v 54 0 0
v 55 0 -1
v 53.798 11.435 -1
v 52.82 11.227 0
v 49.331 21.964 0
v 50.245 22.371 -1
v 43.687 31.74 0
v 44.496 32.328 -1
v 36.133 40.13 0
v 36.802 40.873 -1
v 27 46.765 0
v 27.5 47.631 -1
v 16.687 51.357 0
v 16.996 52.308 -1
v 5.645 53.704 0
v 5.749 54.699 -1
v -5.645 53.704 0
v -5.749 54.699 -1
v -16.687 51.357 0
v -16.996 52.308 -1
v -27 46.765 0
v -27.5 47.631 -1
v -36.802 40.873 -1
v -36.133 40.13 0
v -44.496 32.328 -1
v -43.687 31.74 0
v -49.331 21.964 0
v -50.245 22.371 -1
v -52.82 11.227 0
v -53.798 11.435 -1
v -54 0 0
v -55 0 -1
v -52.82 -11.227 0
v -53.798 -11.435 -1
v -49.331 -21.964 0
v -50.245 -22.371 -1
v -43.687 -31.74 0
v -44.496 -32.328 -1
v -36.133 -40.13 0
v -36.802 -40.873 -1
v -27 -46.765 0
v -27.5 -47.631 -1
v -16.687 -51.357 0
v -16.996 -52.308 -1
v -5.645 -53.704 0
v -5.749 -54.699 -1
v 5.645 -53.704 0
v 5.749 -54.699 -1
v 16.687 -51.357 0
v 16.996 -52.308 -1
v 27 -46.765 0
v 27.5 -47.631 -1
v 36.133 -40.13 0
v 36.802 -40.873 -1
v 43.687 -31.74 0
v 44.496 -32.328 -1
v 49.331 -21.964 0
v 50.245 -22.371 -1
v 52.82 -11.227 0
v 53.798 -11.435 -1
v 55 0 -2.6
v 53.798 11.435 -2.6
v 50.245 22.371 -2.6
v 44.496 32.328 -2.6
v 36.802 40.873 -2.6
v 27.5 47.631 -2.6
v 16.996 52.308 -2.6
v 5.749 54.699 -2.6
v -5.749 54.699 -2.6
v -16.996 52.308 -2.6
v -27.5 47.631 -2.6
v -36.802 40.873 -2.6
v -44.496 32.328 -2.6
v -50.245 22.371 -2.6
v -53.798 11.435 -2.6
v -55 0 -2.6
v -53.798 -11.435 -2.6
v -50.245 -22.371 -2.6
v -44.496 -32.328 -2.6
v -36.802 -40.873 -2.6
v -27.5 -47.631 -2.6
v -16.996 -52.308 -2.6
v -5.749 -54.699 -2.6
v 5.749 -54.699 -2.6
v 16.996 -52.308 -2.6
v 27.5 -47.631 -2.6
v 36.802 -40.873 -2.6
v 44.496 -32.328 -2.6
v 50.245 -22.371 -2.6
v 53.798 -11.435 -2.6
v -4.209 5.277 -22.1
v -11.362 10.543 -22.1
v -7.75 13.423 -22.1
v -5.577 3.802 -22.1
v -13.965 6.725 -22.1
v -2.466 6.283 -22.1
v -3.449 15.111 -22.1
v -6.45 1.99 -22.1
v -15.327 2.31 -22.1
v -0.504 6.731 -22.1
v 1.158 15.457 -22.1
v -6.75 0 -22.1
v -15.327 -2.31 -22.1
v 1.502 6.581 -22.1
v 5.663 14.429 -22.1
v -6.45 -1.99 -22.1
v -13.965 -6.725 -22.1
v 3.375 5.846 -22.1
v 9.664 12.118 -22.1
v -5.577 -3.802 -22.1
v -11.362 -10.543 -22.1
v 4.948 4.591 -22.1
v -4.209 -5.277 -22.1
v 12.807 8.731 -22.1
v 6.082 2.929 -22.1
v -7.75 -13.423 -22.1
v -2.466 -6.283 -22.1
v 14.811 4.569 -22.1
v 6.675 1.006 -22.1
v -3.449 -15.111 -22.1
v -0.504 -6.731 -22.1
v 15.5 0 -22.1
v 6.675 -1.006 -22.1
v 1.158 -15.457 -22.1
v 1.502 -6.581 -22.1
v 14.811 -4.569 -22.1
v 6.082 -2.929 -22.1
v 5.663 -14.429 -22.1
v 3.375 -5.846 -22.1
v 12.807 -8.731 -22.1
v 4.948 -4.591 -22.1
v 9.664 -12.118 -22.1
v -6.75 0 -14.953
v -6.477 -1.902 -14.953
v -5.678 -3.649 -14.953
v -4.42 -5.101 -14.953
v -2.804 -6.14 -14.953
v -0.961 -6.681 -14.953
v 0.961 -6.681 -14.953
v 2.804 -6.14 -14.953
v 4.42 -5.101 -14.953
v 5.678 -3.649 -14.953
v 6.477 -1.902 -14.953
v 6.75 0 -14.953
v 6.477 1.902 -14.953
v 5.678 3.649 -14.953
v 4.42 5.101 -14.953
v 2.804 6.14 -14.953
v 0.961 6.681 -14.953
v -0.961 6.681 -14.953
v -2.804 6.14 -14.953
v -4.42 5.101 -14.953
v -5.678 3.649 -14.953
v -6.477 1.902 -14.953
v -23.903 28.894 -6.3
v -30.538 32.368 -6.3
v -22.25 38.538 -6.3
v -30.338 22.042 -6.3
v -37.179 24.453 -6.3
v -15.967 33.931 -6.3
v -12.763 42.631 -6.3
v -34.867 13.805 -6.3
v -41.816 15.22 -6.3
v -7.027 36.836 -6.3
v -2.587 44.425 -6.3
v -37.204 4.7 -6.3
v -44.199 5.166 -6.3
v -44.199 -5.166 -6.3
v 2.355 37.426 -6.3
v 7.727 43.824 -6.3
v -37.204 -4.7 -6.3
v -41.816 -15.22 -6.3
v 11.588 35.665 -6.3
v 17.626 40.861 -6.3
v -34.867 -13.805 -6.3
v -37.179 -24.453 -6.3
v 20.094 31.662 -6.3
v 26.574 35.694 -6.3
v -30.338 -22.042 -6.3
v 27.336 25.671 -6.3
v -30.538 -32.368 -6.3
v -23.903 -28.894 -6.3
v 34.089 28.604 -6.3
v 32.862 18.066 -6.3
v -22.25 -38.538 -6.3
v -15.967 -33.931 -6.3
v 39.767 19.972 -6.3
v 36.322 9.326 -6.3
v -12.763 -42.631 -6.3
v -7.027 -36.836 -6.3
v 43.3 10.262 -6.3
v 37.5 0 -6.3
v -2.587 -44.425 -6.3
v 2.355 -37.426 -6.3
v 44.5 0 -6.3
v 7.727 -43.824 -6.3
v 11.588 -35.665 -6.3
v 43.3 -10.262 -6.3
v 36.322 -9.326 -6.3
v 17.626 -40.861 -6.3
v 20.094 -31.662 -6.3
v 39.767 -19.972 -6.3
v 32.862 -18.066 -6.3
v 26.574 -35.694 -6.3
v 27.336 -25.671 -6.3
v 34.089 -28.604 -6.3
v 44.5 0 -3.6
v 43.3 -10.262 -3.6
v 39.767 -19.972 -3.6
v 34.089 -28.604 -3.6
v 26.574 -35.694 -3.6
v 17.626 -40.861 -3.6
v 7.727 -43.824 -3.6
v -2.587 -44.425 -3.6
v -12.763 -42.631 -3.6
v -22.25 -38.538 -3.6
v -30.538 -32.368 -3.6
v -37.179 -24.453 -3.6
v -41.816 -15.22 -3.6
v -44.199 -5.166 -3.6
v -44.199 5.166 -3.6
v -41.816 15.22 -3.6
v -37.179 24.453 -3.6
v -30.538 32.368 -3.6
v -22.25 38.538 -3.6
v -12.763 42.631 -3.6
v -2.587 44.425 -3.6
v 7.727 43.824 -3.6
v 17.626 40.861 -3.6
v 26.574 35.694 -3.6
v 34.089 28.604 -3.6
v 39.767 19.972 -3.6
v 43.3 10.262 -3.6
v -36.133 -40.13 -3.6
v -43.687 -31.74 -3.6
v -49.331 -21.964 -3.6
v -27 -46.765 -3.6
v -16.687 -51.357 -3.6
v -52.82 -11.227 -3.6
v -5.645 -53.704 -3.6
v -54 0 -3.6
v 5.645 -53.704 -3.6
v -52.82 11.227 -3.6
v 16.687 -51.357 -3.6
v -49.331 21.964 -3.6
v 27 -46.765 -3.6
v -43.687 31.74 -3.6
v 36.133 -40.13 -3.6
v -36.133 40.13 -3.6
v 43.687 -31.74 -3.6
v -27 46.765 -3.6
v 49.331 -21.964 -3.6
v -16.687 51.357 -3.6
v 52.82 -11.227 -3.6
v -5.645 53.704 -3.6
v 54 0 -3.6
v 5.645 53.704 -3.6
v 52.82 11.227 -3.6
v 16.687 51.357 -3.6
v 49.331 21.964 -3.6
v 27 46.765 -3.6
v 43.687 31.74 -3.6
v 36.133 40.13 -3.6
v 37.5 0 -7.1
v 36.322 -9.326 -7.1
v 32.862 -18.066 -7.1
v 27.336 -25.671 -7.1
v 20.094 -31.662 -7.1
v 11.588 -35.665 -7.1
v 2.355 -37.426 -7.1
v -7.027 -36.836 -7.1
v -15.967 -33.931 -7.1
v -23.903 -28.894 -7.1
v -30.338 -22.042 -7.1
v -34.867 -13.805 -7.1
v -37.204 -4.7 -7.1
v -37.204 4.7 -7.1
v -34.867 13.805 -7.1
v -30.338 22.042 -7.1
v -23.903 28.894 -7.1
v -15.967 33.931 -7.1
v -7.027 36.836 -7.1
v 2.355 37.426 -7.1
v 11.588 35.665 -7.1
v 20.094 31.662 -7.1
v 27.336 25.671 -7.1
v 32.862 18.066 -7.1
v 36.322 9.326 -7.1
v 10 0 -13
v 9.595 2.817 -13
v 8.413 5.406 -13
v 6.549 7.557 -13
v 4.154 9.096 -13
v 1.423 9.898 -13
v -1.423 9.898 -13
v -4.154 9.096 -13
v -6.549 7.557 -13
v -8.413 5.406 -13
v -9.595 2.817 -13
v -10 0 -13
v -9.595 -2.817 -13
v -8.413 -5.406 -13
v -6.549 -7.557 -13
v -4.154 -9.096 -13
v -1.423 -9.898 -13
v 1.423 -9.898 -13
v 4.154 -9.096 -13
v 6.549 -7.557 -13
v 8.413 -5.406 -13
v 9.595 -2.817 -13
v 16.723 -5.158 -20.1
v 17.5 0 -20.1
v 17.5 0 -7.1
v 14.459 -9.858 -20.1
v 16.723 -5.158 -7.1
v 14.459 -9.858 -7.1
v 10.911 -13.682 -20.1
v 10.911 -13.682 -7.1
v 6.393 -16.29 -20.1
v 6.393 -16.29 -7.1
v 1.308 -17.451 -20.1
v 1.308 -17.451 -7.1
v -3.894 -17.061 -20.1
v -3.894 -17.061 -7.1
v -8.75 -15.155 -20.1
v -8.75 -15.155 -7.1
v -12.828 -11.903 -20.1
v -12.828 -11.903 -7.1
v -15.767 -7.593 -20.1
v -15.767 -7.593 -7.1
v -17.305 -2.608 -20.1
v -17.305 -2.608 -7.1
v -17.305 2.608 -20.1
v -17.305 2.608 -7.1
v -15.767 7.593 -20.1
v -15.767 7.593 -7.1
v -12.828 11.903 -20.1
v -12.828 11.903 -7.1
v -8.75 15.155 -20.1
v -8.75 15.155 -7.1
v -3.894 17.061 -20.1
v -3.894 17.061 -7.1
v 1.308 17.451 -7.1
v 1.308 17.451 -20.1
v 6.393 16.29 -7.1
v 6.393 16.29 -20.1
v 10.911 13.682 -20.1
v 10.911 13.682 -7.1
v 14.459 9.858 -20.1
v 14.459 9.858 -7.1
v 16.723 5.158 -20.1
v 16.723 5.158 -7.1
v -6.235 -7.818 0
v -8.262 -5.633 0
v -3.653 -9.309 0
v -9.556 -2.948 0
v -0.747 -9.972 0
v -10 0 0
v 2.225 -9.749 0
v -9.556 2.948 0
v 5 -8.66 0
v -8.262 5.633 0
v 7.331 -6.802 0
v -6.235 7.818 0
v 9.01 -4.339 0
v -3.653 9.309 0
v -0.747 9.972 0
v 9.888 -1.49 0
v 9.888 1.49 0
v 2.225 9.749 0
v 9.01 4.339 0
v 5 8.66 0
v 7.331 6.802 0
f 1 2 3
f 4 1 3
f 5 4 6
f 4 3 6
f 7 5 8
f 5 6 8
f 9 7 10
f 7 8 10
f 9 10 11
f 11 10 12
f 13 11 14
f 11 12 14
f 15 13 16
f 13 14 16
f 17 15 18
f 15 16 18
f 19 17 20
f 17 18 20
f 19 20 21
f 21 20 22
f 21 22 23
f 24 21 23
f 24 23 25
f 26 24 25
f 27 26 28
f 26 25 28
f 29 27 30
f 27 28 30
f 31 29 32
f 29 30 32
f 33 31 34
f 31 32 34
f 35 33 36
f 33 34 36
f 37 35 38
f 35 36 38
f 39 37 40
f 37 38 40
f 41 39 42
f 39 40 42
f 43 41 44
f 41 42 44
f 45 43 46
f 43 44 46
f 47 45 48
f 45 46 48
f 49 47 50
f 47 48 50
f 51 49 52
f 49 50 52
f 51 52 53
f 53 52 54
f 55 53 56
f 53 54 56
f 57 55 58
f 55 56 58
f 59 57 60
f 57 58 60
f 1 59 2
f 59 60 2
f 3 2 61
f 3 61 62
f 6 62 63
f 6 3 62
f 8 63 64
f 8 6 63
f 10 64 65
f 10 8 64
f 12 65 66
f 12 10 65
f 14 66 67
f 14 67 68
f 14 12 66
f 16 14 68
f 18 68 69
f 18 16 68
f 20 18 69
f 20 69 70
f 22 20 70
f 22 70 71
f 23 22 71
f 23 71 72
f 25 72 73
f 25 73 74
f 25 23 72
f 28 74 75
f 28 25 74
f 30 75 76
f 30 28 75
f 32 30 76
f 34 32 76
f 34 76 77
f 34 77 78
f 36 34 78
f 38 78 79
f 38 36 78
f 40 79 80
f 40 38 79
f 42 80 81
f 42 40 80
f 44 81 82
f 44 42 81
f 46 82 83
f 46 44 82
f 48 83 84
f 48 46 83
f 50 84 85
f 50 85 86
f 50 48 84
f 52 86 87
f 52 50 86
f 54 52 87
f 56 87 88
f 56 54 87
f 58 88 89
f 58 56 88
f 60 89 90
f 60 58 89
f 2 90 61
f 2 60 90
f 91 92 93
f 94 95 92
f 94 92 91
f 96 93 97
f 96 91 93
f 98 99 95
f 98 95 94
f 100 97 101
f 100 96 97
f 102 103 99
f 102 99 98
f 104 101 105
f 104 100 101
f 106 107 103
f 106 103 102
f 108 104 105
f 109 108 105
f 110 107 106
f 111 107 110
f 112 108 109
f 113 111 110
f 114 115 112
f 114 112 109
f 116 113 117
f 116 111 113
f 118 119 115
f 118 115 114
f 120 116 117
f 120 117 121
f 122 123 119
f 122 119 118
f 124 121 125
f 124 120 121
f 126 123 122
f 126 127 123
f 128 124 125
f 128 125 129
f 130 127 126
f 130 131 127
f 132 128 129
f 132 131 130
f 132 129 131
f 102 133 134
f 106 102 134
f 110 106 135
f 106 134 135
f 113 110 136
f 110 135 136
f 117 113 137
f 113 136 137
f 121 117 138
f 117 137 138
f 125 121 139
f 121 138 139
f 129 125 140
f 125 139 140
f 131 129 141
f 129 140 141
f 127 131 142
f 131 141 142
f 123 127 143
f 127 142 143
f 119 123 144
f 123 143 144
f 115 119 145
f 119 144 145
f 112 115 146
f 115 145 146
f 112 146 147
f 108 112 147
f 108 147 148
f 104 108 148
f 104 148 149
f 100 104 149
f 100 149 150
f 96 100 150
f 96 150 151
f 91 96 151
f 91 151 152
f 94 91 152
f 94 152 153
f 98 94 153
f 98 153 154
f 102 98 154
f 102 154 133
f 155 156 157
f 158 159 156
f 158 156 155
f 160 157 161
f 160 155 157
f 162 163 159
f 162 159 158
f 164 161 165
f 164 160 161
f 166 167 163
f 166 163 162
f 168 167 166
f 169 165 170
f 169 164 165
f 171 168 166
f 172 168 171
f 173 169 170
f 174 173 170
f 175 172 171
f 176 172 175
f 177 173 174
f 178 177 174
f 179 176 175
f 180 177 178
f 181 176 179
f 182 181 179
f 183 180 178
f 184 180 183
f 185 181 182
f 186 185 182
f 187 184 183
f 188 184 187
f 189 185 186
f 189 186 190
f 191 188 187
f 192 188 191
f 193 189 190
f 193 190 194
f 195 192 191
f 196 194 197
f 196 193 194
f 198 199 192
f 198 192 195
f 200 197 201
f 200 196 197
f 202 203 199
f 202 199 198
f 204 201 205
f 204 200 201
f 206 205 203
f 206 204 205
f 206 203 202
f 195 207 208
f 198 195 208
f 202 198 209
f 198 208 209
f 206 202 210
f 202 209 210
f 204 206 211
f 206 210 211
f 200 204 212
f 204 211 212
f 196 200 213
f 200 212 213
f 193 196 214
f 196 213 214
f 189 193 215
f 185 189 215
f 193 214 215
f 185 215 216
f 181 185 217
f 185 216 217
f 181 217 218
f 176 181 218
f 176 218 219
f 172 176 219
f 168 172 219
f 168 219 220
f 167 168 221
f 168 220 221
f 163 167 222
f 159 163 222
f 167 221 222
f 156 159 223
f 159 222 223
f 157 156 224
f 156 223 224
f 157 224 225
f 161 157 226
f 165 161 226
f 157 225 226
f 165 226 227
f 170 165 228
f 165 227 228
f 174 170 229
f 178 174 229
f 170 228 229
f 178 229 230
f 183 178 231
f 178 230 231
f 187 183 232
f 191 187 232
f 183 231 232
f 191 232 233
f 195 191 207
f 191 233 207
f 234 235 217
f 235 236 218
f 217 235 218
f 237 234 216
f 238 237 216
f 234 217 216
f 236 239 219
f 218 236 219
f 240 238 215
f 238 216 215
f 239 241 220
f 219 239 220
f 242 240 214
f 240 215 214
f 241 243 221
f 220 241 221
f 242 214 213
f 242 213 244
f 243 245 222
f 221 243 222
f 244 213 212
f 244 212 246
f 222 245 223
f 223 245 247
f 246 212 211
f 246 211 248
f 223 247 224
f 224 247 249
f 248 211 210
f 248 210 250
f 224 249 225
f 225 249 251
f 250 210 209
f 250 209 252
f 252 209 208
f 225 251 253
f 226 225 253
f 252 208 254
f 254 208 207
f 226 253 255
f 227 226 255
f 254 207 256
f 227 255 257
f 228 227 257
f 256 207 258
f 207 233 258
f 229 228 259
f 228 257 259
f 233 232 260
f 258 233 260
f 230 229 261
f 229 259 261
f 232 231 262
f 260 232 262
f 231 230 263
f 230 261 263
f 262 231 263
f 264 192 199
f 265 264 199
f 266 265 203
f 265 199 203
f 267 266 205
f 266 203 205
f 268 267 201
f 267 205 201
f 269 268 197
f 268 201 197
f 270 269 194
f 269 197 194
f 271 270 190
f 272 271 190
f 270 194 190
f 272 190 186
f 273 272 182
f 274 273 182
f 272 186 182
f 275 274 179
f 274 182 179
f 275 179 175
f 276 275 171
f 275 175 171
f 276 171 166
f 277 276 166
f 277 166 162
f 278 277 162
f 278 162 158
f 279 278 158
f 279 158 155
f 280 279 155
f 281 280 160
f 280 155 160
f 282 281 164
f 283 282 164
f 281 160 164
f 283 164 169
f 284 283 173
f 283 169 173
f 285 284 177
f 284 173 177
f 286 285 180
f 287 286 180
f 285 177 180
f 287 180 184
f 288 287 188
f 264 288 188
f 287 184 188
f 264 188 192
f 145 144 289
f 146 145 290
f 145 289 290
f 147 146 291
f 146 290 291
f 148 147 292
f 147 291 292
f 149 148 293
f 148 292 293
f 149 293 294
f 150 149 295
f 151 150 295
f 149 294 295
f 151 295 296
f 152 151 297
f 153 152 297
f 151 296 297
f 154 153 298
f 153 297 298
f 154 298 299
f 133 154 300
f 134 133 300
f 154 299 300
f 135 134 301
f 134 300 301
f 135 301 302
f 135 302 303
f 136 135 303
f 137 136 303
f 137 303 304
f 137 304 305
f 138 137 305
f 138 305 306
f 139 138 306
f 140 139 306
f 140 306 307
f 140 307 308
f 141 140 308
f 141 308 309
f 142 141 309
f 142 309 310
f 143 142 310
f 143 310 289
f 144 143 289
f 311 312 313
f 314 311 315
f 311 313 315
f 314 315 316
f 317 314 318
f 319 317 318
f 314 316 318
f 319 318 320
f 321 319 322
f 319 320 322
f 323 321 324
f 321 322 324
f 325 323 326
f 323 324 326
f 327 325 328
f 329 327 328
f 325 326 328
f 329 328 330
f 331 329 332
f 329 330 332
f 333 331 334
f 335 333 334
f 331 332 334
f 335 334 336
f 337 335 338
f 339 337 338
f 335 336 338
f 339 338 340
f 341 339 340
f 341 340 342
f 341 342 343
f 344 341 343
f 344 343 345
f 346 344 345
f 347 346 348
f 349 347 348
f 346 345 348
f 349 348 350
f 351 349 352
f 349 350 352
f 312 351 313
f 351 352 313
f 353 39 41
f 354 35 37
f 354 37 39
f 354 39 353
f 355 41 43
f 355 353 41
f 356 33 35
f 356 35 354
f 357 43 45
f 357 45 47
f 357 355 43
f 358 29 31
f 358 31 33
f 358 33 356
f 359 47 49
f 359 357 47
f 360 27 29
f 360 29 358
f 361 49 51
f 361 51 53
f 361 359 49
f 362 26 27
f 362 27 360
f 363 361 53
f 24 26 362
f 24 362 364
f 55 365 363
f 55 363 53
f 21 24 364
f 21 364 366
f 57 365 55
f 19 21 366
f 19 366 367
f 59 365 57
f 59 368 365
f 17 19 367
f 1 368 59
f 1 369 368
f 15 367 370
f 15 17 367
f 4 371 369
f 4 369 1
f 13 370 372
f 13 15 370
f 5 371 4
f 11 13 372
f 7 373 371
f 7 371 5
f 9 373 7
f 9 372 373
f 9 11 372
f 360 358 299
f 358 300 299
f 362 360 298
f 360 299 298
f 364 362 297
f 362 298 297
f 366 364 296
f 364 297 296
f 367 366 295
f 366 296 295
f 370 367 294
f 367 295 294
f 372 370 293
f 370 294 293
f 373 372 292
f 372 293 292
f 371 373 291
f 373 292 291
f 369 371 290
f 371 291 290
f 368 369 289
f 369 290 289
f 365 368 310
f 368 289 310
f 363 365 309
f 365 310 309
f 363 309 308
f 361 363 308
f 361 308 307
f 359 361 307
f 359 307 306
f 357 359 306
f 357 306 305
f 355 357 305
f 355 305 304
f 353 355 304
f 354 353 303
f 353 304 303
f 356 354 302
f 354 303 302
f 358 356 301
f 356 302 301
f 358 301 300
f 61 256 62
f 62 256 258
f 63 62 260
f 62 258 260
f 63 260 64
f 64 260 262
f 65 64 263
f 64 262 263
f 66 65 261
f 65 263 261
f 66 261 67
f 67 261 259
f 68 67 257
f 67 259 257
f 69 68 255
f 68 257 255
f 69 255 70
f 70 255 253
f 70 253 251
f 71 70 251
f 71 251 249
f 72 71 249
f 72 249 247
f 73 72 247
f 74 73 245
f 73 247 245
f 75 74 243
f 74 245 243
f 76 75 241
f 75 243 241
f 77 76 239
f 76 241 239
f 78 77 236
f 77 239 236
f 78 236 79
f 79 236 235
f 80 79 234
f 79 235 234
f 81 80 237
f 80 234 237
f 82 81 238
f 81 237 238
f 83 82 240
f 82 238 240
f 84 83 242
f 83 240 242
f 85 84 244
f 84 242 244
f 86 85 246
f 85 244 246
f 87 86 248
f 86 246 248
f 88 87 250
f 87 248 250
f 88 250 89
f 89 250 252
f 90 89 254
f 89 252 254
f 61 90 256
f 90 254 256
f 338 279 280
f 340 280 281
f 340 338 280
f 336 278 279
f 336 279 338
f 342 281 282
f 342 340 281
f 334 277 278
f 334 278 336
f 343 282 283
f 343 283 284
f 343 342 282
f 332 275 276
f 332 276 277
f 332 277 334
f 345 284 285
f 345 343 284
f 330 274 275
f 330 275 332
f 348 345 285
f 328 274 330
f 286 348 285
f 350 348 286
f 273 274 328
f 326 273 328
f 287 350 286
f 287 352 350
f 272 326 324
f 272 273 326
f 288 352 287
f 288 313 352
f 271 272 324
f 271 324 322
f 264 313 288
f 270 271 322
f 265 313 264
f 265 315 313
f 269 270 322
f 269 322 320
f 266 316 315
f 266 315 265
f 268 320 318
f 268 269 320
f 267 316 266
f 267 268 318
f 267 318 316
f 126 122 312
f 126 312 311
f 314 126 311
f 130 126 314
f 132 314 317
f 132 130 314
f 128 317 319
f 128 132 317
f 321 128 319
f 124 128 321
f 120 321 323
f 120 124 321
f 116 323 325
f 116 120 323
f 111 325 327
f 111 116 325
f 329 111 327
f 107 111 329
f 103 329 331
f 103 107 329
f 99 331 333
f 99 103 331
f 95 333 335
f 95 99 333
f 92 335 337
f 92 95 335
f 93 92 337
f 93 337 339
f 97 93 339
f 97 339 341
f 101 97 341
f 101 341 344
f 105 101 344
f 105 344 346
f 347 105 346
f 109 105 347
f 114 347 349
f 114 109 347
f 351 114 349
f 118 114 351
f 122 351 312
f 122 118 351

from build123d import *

# Parameters (mm, degrees)
F0_R      = 55
F1_DEPTH  = 3.6
F2_R      = 44.5
F3_DEPTH  = 2.7
F4_R      = 37.5
F5_DEPTH  = 0.8
F6_R      = 17.5
F7_DEPTH  = 15
F8_SIZE   = 2
F10_D     = 20
F10_DEPTH = 13
F10_TIP   = 6.0086061903
F13_D     = 13.5
F14_SIZE  = 1
F15_SIZE  = 1


with BuildPart() as f1:
    # F0 (on Top) → F1 (new body)
    with BuildSketch(Plane.XY):
        Circle(F0_R)
    extrude(amount=-F1_DEPTH)

    # F2 (on face) → F3 (join)
    with BuildSketch(Plane(origin=(0, 0, -3.6), x_dir=(1, 0, 0), z_dir=(0, 0, -1))):
        Circle(F2_R)
    extrude(amount=F3_DEPTH)

    # F4 (on face) → F5 (join)
    with BuildSketch(Plane(origin=(0, 0, -6.3), x_dir=(1, 0, 0), z_dir=(0, 0, -1))):
        Circle(F4_R)
    extrude(amount=F5_DEPTH)

    # F6 (on face) → F7 (join)
    with BuildSketch(Plane(origin=(0, 0, -7.1), x_dir=(1, 0, 0), z_dir=(0, 0, -1))):
        Circle(F6_R)
    extrude(amount=F7_DEPTH)

    # F8
    f8_edges = [f1.edges().sort_by_distance(p)[0] for p in [
        (-17.5, 0, -22.1),
    ]]
    chamfer(f8_edges, length=F8_SIZE)

    # F10
    with Locations(Plane.XY):
        with Locations((0, 0)):
            Hole(F10_D / 2, depth=F10_DEPTH)
            with Locations((0, 0, -(F10_DEPTH + F10_TIP / 2))):  # 118° drill point
                Cone(0, F10_D / 2, F10_TIP, mode=Mode.SUBTRACT)

    # F13 (through all)
    with Locations(Plane(origin=(0, 0, -22.1), x_dir=(1, 0, 0), z_dir=(0, 0, -1))):
        with Locations((0, 0)):
            Hole(F13_D / 2)

    # F14
    f14_edges = [f1.edges().sort_by_distance(p)[0] for p in [
        (-55, 0, 0),
    ]]
    chamfer(f14_edges, length=F14_SIZE)

    # F15
    f15_edges = [f1.edges().sort_by_distance(p)[0] for p in [
        (-55, 0, -3.6),
    ]]
    chamfer(f15_edges, length=F15_SIZE)


solid = f1.part
